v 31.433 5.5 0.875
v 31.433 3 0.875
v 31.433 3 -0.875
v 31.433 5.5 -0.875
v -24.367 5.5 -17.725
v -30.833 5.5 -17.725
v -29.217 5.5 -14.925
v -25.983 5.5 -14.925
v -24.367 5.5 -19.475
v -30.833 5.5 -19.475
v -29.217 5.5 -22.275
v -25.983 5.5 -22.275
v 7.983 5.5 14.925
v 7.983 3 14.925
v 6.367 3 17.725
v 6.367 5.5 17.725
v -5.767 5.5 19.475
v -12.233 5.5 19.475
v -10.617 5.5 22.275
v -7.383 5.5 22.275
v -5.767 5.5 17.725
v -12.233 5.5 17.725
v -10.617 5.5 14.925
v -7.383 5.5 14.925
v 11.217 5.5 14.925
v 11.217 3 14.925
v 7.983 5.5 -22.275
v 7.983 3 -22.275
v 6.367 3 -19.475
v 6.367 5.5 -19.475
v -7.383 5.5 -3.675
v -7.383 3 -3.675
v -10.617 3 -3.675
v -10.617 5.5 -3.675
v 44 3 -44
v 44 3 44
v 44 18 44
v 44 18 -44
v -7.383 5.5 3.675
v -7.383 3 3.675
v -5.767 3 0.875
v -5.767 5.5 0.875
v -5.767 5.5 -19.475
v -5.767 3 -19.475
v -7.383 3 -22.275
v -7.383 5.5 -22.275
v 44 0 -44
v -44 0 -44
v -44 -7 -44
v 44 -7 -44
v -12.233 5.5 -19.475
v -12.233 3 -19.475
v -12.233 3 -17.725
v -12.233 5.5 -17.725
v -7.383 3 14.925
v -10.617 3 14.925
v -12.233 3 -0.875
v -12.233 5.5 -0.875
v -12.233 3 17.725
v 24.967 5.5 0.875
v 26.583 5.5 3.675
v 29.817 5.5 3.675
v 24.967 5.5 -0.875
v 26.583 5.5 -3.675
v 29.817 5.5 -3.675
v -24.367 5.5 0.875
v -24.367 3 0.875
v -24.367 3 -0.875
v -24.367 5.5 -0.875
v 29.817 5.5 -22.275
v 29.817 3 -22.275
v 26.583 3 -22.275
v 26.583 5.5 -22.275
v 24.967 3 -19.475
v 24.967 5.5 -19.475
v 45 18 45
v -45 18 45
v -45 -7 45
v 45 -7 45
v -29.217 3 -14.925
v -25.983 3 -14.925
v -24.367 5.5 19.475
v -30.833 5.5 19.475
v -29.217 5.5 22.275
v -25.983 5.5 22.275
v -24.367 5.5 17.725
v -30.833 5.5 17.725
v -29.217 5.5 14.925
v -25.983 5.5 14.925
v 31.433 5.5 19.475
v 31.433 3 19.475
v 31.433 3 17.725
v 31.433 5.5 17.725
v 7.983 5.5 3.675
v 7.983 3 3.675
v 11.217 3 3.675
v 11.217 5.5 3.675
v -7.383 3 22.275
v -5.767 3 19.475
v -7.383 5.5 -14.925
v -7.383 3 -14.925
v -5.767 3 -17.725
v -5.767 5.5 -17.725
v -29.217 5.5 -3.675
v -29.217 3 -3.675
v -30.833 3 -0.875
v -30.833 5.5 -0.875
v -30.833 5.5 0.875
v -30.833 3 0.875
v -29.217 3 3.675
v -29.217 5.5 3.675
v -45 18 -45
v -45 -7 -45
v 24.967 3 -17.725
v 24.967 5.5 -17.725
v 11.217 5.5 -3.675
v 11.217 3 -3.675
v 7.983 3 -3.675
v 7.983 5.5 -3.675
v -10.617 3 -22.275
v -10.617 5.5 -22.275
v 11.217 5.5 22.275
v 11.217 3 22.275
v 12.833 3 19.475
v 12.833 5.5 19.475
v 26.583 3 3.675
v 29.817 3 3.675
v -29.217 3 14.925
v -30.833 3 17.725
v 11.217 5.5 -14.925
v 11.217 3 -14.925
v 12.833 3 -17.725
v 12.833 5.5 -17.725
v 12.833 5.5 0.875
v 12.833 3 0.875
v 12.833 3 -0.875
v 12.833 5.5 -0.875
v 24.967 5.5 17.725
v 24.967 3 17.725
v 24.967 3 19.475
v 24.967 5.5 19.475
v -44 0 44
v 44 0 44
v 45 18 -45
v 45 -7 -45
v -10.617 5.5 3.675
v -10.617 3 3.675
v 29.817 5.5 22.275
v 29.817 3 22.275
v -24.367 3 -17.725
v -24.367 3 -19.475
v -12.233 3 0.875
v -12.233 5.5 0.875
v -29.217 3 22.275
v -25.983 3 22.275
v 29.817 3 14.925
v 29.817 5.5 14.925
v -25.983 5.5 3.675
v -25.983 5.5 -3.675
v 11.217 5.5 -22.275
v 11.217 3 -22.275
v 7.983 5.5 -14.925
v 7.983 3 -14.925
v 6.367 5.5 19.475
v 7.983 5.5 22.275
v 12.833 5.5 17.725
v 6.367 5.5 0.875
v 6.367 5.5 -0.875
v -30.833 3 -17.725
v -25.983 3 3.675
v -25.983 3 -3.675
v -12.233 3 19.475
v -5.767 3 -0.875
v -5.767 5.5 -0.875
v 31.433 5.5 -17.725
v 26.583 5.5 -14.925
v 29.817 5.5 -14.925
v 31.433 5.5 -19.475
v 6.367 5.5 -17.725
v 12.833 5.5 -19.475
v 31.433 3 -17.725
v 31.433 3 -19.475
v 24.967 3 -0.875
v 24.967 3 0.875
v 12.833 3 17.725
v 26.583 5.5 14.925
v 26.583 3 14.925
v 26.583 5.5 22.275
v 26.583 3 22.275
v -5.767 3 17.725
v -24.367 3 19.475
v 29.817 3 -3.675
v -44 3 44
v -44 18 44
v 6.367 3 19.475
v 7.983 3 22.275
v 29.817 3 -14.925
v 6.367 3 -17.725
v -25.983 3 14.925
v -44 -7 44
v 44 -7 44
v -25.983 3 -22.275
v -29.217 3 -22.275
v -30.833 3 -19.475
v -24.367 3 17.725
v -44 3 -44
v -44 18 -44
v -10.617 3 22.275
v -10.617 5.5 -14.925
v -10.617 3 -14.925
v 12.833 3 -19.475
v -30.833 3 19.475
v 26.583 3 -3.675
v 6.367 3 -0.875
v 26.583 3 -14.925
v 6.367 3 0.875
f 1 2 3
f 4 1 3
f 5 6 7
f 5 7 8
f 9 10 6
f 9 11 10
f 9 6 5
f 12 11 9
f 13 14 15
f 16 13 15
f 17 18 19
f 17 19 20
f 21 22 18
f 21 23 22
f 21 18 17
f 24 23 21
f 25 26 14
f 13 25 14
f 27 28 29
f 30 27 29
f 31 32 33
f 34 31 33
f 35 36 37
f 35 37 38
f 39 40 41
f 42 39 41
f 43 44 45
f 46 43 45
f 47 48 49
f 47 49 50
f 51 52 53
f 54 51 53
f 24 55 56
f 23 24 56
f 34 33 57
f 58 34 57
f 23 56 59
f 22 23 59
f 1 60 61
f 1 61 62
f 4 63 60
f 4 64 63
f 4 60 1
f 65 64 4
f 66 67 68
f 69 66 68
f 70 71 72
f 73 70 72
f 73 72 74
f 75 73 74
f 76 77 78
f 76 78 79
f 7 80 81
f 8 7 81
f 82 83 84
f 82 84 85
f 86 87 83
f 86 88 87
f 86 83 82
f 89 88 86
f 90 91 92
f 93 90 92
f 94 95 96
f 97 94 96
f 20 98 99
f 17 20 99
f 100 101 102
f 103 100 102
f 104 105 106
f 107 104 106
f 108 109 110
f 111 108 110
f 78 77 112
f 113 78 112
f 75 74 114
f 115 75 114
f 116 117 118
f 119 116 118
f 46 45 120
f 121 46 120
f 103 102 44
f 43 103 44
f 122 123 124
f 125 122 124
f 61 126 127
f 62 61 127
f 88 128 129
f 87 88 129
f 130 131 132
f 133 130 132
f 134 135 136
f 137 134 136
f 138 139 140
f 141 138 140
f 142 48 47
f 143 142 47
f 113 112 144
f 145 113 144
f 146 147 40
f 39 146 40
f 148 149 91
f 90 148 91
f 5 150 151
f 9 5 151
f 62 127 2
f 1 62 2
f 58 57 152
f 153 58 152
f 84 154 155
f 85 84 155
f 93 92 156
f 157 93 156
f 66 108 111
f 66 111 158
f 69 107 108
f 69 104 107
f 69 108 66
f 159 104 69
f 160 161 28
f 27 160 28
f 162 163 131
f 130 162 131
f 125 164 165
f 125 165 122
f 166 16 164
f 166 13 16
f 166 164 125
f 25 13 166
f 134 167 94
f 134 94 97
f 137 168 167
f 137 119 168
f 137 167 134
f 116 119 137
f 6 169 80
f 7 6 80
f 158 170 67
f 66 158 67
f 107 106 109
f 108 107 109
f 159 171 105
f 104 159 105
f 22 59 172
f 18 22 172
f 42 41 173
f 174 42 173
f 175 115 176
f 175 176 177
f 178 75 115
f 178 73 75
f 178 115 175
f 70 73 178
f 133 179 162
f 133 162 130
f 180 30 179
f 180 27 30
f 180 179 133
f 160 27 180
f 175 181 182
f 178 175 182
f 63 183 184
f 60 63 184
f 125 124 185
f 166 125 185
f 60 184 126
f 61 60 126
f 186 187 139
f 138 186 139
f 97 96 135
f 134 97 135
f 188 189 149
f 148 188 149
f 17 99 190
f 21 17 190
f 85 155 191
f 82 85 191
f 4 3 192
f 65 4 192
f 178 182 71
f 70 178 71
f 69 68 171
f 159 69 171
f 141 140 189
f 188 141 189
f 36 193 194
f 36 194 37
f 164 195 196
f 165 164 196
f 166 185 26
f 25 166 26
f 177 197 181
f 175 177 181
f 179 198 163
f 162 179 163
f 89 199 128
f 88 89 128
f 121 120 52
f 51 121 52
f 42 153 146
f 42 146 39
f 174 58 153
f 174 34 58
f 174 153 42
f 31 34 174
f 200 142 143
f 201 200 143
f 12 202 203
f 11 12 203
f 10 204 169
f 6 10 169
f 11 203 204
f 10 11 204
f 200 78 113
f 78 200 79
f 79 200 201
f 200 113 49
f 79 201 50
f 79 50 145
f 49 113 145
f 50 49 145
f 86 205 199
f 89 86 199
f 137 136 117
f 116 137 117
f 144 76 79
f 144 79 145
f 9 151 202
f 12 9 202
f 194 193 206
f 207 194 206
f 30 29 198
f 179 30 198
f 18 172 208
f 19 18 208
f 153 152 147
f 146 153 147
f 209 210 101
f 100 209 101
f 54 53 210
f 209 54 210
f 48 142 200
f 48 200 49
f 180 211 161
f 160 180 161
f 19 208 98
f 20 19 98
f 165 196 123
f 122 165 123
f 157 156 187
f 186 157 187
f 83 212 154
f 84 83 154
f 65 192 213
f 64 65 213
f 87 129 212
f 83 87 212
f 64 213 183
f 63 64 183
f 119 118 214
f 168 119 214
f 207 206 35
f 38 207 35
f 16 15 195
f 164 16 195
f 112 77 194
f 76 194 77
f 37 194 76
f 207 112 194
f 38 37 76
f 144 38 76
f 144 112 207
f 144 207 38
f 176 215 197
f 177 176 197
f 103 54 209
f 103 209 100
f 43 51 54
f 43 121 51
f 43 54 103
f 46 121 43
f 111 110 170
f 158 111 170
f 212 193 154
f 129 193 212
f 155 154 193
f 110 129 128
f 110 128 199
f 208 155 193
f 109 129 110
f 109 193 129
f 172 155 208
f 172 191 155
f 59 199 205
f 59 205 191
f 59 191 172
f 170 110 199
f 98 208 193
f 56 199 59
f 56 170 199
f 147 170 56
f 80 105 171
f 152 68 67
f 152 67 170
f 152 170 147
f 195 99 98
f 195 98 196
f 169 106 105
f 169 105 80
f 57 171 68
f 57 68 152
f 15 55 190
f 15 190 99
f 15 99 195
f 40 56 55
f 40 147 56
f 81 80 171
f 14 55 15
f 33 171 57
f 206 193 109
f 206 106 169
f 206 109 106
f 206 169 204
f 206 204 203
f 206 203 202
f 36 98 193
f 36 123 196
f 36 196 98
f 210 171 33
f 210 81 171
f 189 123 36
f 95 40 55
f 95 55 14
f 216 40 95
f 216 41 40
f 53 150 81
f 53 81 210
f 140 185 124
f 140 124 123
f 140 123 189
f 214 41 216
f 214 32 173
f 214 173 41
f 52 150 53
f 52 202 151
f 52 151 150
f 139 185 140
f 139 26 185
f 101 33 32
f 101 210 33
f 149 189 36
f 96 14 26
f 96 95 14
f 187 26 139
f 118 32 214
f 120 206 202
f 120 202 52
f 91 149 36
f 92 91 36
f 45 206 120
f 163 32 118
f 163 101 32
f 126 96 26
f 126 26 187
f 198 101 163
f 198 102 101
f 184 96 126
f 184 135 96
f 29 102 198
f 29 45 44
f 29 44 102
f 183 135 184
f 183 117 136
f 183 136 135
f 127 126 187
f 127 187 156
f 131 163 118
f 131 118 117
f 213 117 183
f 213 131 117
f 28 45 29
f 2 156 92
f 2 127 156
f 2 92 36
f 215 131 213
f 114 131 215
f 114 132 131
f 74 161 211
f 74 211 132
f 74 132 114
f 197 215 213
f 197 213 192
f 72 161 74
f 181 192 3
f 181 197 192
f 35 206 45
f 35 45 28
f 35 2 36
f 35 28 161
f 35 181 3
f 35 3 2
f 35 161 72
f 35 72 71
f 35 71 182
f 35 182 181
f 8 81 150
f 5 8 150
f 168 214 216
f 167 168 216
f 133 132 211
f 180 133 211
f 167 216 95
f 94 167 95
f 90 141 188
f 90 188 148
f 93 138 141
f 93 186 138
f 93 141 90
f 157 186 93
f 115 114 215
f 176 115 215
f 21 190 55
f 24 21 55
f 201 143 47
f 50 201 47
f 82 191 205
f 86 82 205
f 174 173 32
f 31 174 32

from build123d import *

# Parameters (mm, degrees)
SKETCH1_W                = 90
SKETCH1_H                = 90
BOSS_EXTRUDE1_DEPTH      = 3
BOSS_EXTRUDE3_DEPTH      = 2.5
SKETCH6_W                = 90
SKETCH6_H                = 90
SKETCH6_W_2              = 88
SKETCH6_H_2              = 88
BOSS_EXTRUDE4_DEPTH      = 15
BOSS_EXTRUDE4_DEPTH_BACK = 10


with BuildPart() as part:
    # Sketch1 → Boss-Extrude1 (new body)
    with BuildSketch(Plane(origin=(0, 0, 0), x_dir=(1, 0, 0), z_dir=(0, 1, 0))):
        Rectangle(SKETCH1_W, SKETCH1_H)
    extrude(amount=BOSS_EXTRUDE1_DEPTH)

    # Sketch4 → Boss-Extrude3 (add)
    with BuildSketch(Plane(origin=(0, 3, 0), x_dir=(1, 0, 0), z_dir=(0, 1, 0))):
        Polygon((6.366838491, 0.875), (6.366838491, -0.875), (7.983419247, -3.675000002), (11.216580757, -3.675000001), (12.833161509, -0.875), (12.833161509, 0), (12.833161509, 0.875), (11.216580757, 3.675000001), (7.983419247, 3.675000002), align=None)
        Polygon((6.366838491, 19.475), (6.366838491, 17.725), (7.983419247, 14.924999998), (11.216580757, 14.924999999), (12.833161509, 17.725), (12.833161509, 18.6), (12.833161509, 19.475), (11.216580757, 22.275000001), (7.983419247, 22.275000002), align=None)
        Polygon((24.966838491, 0.875), (24.966838491, -0.875), (26.583419247, -3.675000002), (29.816580757, -3.675000001), (31.433161509, -0.875), (31.433161509, 0), (31.433161509, 0.875), (29.816580757, 3.675000001), (26.583419247, 3.675000002), align=None)
        Polygon((24.966838491, -17.725), (24.966838491, -19.475), (26.583419247, -22.275000002), (29.816580757, -22.275000001), (31.433161509, -19.475), (31.433161509, -18.6), (31.433161509, -17.725), (29.816580757, -14.924999999), (26.583419247, -14.924999998), align=None)
        Polygon((6.366838491, -17.725), (6.366838491, -19.475), (7.983419247, -22.275000002), (11.216580757, -22.275000001), (12.833161509, -19.475), (12.833161509, -18.6), (12.833161509, -17.725), (11.216580757, -14.924999999), (7.983419247, -14.924999998), align=None)
        Polygon((-30.833161509, 0.875), (-30.833161509, -0.875), (-29.216580753, -3.675000002), (-25.983419243, -3.675000001), (-24.366838491, -0.875), (-24.366838491, 0), (-24.366838491, 0.875), (-25.983419243, 3.675000001), (-29.216580753, 3.675000002), align=None)
        Polygon((-12.233161509, 0.875), (-12.233161509, -0.875), (-10.616580753, -3.675000002), (-7.383419243, -3.675000001), (-5.766838491, -0.875), (-5.766838491, 0), (-5.766838491, 0.875), (-7.383419243, 3.675000001), (-10.616580753, 3.675000002), align=None)
        Polygon((-12.233161509, -17.725), (-12.233161509, -19.475), (-10.616580753, -22.275000002), (-7.383419243, -22.275000001), (-5.766838491, -19.475), (-5.766838491, -18.6), (-5.766838491, -17.725), (-7.383419243, -14.924999999), (-10.616580753, -14.924999998), align=None)
        Polygon((-30.833161509, -17.725), (-30.833161509, -19.475), (-29.216580753, -22.275000002), (-25.983419243, -22.275000001), (-24.366838491, -19.475), (-24.366838491, -18.6), (-24.366838491, -17.725), (-25.983419243, -14.924999999), (-29.216580753, -14.924999998), align=None)
        Polygon((24.966838491, 19.475), (24.966838491, 17.725), (26.583419247, 14.924999998), (29.816580757, 14.924999999), (31.433161509, 17.725), (31.433161509, 18.6), (31.433161509, 19.475), (29.816580757, 22.275000001), (26.583419247, 22.275000002), align=None)
        Polygon((-30.833161509, 19.475), (-30.833161509, 17.725), (-29.216580753, 14.924999998), (-25.983419243, 14.924999999), (-24.366838491, 17.725), (-24.366838491, 18.6), (-24.366838491, 19.475), (-25.983419243, 22.275000001), (-29.216580753, 22.275000002), align=None)
        Polygon((-12.233161509, 19.475), (-12.233161509, 17.725), (-10.616580753, 14.924999998), (-7.383419243, 14.924999999), (-5.766838491, 17.725), (-5.766838491, 18.6), (-5.766838491, 19.475), (-7.383419243, 22.275000001), (-10.616580753, 22.275000002), align=None)
    extrude(amount=BOSS_EXTRUDE3_DEPTH)

    # Sketch6 → Boss-Extrude4 (add, two sides)
    with BuildSketch(Plane(origin=(0, 3, 0), x_dir=(1, 0, 0), z_dir=(0, 1, 0))) as boss_extrude4_sk:
        Rectangle(SKETCH6_W, SKETCH6_H)
        Rectangle(SKETCH6_W_2, SKETCH6_H_2, mode=Mode.SUBTRACT)
    extrude(amount=BOSS_EXTRUDE4_DEPTH)
    extrude(boss_extrude4_sk.sketch, amount=-BOSS_EXTRUDE4_DEPTH_BACK)


solid = part.part
